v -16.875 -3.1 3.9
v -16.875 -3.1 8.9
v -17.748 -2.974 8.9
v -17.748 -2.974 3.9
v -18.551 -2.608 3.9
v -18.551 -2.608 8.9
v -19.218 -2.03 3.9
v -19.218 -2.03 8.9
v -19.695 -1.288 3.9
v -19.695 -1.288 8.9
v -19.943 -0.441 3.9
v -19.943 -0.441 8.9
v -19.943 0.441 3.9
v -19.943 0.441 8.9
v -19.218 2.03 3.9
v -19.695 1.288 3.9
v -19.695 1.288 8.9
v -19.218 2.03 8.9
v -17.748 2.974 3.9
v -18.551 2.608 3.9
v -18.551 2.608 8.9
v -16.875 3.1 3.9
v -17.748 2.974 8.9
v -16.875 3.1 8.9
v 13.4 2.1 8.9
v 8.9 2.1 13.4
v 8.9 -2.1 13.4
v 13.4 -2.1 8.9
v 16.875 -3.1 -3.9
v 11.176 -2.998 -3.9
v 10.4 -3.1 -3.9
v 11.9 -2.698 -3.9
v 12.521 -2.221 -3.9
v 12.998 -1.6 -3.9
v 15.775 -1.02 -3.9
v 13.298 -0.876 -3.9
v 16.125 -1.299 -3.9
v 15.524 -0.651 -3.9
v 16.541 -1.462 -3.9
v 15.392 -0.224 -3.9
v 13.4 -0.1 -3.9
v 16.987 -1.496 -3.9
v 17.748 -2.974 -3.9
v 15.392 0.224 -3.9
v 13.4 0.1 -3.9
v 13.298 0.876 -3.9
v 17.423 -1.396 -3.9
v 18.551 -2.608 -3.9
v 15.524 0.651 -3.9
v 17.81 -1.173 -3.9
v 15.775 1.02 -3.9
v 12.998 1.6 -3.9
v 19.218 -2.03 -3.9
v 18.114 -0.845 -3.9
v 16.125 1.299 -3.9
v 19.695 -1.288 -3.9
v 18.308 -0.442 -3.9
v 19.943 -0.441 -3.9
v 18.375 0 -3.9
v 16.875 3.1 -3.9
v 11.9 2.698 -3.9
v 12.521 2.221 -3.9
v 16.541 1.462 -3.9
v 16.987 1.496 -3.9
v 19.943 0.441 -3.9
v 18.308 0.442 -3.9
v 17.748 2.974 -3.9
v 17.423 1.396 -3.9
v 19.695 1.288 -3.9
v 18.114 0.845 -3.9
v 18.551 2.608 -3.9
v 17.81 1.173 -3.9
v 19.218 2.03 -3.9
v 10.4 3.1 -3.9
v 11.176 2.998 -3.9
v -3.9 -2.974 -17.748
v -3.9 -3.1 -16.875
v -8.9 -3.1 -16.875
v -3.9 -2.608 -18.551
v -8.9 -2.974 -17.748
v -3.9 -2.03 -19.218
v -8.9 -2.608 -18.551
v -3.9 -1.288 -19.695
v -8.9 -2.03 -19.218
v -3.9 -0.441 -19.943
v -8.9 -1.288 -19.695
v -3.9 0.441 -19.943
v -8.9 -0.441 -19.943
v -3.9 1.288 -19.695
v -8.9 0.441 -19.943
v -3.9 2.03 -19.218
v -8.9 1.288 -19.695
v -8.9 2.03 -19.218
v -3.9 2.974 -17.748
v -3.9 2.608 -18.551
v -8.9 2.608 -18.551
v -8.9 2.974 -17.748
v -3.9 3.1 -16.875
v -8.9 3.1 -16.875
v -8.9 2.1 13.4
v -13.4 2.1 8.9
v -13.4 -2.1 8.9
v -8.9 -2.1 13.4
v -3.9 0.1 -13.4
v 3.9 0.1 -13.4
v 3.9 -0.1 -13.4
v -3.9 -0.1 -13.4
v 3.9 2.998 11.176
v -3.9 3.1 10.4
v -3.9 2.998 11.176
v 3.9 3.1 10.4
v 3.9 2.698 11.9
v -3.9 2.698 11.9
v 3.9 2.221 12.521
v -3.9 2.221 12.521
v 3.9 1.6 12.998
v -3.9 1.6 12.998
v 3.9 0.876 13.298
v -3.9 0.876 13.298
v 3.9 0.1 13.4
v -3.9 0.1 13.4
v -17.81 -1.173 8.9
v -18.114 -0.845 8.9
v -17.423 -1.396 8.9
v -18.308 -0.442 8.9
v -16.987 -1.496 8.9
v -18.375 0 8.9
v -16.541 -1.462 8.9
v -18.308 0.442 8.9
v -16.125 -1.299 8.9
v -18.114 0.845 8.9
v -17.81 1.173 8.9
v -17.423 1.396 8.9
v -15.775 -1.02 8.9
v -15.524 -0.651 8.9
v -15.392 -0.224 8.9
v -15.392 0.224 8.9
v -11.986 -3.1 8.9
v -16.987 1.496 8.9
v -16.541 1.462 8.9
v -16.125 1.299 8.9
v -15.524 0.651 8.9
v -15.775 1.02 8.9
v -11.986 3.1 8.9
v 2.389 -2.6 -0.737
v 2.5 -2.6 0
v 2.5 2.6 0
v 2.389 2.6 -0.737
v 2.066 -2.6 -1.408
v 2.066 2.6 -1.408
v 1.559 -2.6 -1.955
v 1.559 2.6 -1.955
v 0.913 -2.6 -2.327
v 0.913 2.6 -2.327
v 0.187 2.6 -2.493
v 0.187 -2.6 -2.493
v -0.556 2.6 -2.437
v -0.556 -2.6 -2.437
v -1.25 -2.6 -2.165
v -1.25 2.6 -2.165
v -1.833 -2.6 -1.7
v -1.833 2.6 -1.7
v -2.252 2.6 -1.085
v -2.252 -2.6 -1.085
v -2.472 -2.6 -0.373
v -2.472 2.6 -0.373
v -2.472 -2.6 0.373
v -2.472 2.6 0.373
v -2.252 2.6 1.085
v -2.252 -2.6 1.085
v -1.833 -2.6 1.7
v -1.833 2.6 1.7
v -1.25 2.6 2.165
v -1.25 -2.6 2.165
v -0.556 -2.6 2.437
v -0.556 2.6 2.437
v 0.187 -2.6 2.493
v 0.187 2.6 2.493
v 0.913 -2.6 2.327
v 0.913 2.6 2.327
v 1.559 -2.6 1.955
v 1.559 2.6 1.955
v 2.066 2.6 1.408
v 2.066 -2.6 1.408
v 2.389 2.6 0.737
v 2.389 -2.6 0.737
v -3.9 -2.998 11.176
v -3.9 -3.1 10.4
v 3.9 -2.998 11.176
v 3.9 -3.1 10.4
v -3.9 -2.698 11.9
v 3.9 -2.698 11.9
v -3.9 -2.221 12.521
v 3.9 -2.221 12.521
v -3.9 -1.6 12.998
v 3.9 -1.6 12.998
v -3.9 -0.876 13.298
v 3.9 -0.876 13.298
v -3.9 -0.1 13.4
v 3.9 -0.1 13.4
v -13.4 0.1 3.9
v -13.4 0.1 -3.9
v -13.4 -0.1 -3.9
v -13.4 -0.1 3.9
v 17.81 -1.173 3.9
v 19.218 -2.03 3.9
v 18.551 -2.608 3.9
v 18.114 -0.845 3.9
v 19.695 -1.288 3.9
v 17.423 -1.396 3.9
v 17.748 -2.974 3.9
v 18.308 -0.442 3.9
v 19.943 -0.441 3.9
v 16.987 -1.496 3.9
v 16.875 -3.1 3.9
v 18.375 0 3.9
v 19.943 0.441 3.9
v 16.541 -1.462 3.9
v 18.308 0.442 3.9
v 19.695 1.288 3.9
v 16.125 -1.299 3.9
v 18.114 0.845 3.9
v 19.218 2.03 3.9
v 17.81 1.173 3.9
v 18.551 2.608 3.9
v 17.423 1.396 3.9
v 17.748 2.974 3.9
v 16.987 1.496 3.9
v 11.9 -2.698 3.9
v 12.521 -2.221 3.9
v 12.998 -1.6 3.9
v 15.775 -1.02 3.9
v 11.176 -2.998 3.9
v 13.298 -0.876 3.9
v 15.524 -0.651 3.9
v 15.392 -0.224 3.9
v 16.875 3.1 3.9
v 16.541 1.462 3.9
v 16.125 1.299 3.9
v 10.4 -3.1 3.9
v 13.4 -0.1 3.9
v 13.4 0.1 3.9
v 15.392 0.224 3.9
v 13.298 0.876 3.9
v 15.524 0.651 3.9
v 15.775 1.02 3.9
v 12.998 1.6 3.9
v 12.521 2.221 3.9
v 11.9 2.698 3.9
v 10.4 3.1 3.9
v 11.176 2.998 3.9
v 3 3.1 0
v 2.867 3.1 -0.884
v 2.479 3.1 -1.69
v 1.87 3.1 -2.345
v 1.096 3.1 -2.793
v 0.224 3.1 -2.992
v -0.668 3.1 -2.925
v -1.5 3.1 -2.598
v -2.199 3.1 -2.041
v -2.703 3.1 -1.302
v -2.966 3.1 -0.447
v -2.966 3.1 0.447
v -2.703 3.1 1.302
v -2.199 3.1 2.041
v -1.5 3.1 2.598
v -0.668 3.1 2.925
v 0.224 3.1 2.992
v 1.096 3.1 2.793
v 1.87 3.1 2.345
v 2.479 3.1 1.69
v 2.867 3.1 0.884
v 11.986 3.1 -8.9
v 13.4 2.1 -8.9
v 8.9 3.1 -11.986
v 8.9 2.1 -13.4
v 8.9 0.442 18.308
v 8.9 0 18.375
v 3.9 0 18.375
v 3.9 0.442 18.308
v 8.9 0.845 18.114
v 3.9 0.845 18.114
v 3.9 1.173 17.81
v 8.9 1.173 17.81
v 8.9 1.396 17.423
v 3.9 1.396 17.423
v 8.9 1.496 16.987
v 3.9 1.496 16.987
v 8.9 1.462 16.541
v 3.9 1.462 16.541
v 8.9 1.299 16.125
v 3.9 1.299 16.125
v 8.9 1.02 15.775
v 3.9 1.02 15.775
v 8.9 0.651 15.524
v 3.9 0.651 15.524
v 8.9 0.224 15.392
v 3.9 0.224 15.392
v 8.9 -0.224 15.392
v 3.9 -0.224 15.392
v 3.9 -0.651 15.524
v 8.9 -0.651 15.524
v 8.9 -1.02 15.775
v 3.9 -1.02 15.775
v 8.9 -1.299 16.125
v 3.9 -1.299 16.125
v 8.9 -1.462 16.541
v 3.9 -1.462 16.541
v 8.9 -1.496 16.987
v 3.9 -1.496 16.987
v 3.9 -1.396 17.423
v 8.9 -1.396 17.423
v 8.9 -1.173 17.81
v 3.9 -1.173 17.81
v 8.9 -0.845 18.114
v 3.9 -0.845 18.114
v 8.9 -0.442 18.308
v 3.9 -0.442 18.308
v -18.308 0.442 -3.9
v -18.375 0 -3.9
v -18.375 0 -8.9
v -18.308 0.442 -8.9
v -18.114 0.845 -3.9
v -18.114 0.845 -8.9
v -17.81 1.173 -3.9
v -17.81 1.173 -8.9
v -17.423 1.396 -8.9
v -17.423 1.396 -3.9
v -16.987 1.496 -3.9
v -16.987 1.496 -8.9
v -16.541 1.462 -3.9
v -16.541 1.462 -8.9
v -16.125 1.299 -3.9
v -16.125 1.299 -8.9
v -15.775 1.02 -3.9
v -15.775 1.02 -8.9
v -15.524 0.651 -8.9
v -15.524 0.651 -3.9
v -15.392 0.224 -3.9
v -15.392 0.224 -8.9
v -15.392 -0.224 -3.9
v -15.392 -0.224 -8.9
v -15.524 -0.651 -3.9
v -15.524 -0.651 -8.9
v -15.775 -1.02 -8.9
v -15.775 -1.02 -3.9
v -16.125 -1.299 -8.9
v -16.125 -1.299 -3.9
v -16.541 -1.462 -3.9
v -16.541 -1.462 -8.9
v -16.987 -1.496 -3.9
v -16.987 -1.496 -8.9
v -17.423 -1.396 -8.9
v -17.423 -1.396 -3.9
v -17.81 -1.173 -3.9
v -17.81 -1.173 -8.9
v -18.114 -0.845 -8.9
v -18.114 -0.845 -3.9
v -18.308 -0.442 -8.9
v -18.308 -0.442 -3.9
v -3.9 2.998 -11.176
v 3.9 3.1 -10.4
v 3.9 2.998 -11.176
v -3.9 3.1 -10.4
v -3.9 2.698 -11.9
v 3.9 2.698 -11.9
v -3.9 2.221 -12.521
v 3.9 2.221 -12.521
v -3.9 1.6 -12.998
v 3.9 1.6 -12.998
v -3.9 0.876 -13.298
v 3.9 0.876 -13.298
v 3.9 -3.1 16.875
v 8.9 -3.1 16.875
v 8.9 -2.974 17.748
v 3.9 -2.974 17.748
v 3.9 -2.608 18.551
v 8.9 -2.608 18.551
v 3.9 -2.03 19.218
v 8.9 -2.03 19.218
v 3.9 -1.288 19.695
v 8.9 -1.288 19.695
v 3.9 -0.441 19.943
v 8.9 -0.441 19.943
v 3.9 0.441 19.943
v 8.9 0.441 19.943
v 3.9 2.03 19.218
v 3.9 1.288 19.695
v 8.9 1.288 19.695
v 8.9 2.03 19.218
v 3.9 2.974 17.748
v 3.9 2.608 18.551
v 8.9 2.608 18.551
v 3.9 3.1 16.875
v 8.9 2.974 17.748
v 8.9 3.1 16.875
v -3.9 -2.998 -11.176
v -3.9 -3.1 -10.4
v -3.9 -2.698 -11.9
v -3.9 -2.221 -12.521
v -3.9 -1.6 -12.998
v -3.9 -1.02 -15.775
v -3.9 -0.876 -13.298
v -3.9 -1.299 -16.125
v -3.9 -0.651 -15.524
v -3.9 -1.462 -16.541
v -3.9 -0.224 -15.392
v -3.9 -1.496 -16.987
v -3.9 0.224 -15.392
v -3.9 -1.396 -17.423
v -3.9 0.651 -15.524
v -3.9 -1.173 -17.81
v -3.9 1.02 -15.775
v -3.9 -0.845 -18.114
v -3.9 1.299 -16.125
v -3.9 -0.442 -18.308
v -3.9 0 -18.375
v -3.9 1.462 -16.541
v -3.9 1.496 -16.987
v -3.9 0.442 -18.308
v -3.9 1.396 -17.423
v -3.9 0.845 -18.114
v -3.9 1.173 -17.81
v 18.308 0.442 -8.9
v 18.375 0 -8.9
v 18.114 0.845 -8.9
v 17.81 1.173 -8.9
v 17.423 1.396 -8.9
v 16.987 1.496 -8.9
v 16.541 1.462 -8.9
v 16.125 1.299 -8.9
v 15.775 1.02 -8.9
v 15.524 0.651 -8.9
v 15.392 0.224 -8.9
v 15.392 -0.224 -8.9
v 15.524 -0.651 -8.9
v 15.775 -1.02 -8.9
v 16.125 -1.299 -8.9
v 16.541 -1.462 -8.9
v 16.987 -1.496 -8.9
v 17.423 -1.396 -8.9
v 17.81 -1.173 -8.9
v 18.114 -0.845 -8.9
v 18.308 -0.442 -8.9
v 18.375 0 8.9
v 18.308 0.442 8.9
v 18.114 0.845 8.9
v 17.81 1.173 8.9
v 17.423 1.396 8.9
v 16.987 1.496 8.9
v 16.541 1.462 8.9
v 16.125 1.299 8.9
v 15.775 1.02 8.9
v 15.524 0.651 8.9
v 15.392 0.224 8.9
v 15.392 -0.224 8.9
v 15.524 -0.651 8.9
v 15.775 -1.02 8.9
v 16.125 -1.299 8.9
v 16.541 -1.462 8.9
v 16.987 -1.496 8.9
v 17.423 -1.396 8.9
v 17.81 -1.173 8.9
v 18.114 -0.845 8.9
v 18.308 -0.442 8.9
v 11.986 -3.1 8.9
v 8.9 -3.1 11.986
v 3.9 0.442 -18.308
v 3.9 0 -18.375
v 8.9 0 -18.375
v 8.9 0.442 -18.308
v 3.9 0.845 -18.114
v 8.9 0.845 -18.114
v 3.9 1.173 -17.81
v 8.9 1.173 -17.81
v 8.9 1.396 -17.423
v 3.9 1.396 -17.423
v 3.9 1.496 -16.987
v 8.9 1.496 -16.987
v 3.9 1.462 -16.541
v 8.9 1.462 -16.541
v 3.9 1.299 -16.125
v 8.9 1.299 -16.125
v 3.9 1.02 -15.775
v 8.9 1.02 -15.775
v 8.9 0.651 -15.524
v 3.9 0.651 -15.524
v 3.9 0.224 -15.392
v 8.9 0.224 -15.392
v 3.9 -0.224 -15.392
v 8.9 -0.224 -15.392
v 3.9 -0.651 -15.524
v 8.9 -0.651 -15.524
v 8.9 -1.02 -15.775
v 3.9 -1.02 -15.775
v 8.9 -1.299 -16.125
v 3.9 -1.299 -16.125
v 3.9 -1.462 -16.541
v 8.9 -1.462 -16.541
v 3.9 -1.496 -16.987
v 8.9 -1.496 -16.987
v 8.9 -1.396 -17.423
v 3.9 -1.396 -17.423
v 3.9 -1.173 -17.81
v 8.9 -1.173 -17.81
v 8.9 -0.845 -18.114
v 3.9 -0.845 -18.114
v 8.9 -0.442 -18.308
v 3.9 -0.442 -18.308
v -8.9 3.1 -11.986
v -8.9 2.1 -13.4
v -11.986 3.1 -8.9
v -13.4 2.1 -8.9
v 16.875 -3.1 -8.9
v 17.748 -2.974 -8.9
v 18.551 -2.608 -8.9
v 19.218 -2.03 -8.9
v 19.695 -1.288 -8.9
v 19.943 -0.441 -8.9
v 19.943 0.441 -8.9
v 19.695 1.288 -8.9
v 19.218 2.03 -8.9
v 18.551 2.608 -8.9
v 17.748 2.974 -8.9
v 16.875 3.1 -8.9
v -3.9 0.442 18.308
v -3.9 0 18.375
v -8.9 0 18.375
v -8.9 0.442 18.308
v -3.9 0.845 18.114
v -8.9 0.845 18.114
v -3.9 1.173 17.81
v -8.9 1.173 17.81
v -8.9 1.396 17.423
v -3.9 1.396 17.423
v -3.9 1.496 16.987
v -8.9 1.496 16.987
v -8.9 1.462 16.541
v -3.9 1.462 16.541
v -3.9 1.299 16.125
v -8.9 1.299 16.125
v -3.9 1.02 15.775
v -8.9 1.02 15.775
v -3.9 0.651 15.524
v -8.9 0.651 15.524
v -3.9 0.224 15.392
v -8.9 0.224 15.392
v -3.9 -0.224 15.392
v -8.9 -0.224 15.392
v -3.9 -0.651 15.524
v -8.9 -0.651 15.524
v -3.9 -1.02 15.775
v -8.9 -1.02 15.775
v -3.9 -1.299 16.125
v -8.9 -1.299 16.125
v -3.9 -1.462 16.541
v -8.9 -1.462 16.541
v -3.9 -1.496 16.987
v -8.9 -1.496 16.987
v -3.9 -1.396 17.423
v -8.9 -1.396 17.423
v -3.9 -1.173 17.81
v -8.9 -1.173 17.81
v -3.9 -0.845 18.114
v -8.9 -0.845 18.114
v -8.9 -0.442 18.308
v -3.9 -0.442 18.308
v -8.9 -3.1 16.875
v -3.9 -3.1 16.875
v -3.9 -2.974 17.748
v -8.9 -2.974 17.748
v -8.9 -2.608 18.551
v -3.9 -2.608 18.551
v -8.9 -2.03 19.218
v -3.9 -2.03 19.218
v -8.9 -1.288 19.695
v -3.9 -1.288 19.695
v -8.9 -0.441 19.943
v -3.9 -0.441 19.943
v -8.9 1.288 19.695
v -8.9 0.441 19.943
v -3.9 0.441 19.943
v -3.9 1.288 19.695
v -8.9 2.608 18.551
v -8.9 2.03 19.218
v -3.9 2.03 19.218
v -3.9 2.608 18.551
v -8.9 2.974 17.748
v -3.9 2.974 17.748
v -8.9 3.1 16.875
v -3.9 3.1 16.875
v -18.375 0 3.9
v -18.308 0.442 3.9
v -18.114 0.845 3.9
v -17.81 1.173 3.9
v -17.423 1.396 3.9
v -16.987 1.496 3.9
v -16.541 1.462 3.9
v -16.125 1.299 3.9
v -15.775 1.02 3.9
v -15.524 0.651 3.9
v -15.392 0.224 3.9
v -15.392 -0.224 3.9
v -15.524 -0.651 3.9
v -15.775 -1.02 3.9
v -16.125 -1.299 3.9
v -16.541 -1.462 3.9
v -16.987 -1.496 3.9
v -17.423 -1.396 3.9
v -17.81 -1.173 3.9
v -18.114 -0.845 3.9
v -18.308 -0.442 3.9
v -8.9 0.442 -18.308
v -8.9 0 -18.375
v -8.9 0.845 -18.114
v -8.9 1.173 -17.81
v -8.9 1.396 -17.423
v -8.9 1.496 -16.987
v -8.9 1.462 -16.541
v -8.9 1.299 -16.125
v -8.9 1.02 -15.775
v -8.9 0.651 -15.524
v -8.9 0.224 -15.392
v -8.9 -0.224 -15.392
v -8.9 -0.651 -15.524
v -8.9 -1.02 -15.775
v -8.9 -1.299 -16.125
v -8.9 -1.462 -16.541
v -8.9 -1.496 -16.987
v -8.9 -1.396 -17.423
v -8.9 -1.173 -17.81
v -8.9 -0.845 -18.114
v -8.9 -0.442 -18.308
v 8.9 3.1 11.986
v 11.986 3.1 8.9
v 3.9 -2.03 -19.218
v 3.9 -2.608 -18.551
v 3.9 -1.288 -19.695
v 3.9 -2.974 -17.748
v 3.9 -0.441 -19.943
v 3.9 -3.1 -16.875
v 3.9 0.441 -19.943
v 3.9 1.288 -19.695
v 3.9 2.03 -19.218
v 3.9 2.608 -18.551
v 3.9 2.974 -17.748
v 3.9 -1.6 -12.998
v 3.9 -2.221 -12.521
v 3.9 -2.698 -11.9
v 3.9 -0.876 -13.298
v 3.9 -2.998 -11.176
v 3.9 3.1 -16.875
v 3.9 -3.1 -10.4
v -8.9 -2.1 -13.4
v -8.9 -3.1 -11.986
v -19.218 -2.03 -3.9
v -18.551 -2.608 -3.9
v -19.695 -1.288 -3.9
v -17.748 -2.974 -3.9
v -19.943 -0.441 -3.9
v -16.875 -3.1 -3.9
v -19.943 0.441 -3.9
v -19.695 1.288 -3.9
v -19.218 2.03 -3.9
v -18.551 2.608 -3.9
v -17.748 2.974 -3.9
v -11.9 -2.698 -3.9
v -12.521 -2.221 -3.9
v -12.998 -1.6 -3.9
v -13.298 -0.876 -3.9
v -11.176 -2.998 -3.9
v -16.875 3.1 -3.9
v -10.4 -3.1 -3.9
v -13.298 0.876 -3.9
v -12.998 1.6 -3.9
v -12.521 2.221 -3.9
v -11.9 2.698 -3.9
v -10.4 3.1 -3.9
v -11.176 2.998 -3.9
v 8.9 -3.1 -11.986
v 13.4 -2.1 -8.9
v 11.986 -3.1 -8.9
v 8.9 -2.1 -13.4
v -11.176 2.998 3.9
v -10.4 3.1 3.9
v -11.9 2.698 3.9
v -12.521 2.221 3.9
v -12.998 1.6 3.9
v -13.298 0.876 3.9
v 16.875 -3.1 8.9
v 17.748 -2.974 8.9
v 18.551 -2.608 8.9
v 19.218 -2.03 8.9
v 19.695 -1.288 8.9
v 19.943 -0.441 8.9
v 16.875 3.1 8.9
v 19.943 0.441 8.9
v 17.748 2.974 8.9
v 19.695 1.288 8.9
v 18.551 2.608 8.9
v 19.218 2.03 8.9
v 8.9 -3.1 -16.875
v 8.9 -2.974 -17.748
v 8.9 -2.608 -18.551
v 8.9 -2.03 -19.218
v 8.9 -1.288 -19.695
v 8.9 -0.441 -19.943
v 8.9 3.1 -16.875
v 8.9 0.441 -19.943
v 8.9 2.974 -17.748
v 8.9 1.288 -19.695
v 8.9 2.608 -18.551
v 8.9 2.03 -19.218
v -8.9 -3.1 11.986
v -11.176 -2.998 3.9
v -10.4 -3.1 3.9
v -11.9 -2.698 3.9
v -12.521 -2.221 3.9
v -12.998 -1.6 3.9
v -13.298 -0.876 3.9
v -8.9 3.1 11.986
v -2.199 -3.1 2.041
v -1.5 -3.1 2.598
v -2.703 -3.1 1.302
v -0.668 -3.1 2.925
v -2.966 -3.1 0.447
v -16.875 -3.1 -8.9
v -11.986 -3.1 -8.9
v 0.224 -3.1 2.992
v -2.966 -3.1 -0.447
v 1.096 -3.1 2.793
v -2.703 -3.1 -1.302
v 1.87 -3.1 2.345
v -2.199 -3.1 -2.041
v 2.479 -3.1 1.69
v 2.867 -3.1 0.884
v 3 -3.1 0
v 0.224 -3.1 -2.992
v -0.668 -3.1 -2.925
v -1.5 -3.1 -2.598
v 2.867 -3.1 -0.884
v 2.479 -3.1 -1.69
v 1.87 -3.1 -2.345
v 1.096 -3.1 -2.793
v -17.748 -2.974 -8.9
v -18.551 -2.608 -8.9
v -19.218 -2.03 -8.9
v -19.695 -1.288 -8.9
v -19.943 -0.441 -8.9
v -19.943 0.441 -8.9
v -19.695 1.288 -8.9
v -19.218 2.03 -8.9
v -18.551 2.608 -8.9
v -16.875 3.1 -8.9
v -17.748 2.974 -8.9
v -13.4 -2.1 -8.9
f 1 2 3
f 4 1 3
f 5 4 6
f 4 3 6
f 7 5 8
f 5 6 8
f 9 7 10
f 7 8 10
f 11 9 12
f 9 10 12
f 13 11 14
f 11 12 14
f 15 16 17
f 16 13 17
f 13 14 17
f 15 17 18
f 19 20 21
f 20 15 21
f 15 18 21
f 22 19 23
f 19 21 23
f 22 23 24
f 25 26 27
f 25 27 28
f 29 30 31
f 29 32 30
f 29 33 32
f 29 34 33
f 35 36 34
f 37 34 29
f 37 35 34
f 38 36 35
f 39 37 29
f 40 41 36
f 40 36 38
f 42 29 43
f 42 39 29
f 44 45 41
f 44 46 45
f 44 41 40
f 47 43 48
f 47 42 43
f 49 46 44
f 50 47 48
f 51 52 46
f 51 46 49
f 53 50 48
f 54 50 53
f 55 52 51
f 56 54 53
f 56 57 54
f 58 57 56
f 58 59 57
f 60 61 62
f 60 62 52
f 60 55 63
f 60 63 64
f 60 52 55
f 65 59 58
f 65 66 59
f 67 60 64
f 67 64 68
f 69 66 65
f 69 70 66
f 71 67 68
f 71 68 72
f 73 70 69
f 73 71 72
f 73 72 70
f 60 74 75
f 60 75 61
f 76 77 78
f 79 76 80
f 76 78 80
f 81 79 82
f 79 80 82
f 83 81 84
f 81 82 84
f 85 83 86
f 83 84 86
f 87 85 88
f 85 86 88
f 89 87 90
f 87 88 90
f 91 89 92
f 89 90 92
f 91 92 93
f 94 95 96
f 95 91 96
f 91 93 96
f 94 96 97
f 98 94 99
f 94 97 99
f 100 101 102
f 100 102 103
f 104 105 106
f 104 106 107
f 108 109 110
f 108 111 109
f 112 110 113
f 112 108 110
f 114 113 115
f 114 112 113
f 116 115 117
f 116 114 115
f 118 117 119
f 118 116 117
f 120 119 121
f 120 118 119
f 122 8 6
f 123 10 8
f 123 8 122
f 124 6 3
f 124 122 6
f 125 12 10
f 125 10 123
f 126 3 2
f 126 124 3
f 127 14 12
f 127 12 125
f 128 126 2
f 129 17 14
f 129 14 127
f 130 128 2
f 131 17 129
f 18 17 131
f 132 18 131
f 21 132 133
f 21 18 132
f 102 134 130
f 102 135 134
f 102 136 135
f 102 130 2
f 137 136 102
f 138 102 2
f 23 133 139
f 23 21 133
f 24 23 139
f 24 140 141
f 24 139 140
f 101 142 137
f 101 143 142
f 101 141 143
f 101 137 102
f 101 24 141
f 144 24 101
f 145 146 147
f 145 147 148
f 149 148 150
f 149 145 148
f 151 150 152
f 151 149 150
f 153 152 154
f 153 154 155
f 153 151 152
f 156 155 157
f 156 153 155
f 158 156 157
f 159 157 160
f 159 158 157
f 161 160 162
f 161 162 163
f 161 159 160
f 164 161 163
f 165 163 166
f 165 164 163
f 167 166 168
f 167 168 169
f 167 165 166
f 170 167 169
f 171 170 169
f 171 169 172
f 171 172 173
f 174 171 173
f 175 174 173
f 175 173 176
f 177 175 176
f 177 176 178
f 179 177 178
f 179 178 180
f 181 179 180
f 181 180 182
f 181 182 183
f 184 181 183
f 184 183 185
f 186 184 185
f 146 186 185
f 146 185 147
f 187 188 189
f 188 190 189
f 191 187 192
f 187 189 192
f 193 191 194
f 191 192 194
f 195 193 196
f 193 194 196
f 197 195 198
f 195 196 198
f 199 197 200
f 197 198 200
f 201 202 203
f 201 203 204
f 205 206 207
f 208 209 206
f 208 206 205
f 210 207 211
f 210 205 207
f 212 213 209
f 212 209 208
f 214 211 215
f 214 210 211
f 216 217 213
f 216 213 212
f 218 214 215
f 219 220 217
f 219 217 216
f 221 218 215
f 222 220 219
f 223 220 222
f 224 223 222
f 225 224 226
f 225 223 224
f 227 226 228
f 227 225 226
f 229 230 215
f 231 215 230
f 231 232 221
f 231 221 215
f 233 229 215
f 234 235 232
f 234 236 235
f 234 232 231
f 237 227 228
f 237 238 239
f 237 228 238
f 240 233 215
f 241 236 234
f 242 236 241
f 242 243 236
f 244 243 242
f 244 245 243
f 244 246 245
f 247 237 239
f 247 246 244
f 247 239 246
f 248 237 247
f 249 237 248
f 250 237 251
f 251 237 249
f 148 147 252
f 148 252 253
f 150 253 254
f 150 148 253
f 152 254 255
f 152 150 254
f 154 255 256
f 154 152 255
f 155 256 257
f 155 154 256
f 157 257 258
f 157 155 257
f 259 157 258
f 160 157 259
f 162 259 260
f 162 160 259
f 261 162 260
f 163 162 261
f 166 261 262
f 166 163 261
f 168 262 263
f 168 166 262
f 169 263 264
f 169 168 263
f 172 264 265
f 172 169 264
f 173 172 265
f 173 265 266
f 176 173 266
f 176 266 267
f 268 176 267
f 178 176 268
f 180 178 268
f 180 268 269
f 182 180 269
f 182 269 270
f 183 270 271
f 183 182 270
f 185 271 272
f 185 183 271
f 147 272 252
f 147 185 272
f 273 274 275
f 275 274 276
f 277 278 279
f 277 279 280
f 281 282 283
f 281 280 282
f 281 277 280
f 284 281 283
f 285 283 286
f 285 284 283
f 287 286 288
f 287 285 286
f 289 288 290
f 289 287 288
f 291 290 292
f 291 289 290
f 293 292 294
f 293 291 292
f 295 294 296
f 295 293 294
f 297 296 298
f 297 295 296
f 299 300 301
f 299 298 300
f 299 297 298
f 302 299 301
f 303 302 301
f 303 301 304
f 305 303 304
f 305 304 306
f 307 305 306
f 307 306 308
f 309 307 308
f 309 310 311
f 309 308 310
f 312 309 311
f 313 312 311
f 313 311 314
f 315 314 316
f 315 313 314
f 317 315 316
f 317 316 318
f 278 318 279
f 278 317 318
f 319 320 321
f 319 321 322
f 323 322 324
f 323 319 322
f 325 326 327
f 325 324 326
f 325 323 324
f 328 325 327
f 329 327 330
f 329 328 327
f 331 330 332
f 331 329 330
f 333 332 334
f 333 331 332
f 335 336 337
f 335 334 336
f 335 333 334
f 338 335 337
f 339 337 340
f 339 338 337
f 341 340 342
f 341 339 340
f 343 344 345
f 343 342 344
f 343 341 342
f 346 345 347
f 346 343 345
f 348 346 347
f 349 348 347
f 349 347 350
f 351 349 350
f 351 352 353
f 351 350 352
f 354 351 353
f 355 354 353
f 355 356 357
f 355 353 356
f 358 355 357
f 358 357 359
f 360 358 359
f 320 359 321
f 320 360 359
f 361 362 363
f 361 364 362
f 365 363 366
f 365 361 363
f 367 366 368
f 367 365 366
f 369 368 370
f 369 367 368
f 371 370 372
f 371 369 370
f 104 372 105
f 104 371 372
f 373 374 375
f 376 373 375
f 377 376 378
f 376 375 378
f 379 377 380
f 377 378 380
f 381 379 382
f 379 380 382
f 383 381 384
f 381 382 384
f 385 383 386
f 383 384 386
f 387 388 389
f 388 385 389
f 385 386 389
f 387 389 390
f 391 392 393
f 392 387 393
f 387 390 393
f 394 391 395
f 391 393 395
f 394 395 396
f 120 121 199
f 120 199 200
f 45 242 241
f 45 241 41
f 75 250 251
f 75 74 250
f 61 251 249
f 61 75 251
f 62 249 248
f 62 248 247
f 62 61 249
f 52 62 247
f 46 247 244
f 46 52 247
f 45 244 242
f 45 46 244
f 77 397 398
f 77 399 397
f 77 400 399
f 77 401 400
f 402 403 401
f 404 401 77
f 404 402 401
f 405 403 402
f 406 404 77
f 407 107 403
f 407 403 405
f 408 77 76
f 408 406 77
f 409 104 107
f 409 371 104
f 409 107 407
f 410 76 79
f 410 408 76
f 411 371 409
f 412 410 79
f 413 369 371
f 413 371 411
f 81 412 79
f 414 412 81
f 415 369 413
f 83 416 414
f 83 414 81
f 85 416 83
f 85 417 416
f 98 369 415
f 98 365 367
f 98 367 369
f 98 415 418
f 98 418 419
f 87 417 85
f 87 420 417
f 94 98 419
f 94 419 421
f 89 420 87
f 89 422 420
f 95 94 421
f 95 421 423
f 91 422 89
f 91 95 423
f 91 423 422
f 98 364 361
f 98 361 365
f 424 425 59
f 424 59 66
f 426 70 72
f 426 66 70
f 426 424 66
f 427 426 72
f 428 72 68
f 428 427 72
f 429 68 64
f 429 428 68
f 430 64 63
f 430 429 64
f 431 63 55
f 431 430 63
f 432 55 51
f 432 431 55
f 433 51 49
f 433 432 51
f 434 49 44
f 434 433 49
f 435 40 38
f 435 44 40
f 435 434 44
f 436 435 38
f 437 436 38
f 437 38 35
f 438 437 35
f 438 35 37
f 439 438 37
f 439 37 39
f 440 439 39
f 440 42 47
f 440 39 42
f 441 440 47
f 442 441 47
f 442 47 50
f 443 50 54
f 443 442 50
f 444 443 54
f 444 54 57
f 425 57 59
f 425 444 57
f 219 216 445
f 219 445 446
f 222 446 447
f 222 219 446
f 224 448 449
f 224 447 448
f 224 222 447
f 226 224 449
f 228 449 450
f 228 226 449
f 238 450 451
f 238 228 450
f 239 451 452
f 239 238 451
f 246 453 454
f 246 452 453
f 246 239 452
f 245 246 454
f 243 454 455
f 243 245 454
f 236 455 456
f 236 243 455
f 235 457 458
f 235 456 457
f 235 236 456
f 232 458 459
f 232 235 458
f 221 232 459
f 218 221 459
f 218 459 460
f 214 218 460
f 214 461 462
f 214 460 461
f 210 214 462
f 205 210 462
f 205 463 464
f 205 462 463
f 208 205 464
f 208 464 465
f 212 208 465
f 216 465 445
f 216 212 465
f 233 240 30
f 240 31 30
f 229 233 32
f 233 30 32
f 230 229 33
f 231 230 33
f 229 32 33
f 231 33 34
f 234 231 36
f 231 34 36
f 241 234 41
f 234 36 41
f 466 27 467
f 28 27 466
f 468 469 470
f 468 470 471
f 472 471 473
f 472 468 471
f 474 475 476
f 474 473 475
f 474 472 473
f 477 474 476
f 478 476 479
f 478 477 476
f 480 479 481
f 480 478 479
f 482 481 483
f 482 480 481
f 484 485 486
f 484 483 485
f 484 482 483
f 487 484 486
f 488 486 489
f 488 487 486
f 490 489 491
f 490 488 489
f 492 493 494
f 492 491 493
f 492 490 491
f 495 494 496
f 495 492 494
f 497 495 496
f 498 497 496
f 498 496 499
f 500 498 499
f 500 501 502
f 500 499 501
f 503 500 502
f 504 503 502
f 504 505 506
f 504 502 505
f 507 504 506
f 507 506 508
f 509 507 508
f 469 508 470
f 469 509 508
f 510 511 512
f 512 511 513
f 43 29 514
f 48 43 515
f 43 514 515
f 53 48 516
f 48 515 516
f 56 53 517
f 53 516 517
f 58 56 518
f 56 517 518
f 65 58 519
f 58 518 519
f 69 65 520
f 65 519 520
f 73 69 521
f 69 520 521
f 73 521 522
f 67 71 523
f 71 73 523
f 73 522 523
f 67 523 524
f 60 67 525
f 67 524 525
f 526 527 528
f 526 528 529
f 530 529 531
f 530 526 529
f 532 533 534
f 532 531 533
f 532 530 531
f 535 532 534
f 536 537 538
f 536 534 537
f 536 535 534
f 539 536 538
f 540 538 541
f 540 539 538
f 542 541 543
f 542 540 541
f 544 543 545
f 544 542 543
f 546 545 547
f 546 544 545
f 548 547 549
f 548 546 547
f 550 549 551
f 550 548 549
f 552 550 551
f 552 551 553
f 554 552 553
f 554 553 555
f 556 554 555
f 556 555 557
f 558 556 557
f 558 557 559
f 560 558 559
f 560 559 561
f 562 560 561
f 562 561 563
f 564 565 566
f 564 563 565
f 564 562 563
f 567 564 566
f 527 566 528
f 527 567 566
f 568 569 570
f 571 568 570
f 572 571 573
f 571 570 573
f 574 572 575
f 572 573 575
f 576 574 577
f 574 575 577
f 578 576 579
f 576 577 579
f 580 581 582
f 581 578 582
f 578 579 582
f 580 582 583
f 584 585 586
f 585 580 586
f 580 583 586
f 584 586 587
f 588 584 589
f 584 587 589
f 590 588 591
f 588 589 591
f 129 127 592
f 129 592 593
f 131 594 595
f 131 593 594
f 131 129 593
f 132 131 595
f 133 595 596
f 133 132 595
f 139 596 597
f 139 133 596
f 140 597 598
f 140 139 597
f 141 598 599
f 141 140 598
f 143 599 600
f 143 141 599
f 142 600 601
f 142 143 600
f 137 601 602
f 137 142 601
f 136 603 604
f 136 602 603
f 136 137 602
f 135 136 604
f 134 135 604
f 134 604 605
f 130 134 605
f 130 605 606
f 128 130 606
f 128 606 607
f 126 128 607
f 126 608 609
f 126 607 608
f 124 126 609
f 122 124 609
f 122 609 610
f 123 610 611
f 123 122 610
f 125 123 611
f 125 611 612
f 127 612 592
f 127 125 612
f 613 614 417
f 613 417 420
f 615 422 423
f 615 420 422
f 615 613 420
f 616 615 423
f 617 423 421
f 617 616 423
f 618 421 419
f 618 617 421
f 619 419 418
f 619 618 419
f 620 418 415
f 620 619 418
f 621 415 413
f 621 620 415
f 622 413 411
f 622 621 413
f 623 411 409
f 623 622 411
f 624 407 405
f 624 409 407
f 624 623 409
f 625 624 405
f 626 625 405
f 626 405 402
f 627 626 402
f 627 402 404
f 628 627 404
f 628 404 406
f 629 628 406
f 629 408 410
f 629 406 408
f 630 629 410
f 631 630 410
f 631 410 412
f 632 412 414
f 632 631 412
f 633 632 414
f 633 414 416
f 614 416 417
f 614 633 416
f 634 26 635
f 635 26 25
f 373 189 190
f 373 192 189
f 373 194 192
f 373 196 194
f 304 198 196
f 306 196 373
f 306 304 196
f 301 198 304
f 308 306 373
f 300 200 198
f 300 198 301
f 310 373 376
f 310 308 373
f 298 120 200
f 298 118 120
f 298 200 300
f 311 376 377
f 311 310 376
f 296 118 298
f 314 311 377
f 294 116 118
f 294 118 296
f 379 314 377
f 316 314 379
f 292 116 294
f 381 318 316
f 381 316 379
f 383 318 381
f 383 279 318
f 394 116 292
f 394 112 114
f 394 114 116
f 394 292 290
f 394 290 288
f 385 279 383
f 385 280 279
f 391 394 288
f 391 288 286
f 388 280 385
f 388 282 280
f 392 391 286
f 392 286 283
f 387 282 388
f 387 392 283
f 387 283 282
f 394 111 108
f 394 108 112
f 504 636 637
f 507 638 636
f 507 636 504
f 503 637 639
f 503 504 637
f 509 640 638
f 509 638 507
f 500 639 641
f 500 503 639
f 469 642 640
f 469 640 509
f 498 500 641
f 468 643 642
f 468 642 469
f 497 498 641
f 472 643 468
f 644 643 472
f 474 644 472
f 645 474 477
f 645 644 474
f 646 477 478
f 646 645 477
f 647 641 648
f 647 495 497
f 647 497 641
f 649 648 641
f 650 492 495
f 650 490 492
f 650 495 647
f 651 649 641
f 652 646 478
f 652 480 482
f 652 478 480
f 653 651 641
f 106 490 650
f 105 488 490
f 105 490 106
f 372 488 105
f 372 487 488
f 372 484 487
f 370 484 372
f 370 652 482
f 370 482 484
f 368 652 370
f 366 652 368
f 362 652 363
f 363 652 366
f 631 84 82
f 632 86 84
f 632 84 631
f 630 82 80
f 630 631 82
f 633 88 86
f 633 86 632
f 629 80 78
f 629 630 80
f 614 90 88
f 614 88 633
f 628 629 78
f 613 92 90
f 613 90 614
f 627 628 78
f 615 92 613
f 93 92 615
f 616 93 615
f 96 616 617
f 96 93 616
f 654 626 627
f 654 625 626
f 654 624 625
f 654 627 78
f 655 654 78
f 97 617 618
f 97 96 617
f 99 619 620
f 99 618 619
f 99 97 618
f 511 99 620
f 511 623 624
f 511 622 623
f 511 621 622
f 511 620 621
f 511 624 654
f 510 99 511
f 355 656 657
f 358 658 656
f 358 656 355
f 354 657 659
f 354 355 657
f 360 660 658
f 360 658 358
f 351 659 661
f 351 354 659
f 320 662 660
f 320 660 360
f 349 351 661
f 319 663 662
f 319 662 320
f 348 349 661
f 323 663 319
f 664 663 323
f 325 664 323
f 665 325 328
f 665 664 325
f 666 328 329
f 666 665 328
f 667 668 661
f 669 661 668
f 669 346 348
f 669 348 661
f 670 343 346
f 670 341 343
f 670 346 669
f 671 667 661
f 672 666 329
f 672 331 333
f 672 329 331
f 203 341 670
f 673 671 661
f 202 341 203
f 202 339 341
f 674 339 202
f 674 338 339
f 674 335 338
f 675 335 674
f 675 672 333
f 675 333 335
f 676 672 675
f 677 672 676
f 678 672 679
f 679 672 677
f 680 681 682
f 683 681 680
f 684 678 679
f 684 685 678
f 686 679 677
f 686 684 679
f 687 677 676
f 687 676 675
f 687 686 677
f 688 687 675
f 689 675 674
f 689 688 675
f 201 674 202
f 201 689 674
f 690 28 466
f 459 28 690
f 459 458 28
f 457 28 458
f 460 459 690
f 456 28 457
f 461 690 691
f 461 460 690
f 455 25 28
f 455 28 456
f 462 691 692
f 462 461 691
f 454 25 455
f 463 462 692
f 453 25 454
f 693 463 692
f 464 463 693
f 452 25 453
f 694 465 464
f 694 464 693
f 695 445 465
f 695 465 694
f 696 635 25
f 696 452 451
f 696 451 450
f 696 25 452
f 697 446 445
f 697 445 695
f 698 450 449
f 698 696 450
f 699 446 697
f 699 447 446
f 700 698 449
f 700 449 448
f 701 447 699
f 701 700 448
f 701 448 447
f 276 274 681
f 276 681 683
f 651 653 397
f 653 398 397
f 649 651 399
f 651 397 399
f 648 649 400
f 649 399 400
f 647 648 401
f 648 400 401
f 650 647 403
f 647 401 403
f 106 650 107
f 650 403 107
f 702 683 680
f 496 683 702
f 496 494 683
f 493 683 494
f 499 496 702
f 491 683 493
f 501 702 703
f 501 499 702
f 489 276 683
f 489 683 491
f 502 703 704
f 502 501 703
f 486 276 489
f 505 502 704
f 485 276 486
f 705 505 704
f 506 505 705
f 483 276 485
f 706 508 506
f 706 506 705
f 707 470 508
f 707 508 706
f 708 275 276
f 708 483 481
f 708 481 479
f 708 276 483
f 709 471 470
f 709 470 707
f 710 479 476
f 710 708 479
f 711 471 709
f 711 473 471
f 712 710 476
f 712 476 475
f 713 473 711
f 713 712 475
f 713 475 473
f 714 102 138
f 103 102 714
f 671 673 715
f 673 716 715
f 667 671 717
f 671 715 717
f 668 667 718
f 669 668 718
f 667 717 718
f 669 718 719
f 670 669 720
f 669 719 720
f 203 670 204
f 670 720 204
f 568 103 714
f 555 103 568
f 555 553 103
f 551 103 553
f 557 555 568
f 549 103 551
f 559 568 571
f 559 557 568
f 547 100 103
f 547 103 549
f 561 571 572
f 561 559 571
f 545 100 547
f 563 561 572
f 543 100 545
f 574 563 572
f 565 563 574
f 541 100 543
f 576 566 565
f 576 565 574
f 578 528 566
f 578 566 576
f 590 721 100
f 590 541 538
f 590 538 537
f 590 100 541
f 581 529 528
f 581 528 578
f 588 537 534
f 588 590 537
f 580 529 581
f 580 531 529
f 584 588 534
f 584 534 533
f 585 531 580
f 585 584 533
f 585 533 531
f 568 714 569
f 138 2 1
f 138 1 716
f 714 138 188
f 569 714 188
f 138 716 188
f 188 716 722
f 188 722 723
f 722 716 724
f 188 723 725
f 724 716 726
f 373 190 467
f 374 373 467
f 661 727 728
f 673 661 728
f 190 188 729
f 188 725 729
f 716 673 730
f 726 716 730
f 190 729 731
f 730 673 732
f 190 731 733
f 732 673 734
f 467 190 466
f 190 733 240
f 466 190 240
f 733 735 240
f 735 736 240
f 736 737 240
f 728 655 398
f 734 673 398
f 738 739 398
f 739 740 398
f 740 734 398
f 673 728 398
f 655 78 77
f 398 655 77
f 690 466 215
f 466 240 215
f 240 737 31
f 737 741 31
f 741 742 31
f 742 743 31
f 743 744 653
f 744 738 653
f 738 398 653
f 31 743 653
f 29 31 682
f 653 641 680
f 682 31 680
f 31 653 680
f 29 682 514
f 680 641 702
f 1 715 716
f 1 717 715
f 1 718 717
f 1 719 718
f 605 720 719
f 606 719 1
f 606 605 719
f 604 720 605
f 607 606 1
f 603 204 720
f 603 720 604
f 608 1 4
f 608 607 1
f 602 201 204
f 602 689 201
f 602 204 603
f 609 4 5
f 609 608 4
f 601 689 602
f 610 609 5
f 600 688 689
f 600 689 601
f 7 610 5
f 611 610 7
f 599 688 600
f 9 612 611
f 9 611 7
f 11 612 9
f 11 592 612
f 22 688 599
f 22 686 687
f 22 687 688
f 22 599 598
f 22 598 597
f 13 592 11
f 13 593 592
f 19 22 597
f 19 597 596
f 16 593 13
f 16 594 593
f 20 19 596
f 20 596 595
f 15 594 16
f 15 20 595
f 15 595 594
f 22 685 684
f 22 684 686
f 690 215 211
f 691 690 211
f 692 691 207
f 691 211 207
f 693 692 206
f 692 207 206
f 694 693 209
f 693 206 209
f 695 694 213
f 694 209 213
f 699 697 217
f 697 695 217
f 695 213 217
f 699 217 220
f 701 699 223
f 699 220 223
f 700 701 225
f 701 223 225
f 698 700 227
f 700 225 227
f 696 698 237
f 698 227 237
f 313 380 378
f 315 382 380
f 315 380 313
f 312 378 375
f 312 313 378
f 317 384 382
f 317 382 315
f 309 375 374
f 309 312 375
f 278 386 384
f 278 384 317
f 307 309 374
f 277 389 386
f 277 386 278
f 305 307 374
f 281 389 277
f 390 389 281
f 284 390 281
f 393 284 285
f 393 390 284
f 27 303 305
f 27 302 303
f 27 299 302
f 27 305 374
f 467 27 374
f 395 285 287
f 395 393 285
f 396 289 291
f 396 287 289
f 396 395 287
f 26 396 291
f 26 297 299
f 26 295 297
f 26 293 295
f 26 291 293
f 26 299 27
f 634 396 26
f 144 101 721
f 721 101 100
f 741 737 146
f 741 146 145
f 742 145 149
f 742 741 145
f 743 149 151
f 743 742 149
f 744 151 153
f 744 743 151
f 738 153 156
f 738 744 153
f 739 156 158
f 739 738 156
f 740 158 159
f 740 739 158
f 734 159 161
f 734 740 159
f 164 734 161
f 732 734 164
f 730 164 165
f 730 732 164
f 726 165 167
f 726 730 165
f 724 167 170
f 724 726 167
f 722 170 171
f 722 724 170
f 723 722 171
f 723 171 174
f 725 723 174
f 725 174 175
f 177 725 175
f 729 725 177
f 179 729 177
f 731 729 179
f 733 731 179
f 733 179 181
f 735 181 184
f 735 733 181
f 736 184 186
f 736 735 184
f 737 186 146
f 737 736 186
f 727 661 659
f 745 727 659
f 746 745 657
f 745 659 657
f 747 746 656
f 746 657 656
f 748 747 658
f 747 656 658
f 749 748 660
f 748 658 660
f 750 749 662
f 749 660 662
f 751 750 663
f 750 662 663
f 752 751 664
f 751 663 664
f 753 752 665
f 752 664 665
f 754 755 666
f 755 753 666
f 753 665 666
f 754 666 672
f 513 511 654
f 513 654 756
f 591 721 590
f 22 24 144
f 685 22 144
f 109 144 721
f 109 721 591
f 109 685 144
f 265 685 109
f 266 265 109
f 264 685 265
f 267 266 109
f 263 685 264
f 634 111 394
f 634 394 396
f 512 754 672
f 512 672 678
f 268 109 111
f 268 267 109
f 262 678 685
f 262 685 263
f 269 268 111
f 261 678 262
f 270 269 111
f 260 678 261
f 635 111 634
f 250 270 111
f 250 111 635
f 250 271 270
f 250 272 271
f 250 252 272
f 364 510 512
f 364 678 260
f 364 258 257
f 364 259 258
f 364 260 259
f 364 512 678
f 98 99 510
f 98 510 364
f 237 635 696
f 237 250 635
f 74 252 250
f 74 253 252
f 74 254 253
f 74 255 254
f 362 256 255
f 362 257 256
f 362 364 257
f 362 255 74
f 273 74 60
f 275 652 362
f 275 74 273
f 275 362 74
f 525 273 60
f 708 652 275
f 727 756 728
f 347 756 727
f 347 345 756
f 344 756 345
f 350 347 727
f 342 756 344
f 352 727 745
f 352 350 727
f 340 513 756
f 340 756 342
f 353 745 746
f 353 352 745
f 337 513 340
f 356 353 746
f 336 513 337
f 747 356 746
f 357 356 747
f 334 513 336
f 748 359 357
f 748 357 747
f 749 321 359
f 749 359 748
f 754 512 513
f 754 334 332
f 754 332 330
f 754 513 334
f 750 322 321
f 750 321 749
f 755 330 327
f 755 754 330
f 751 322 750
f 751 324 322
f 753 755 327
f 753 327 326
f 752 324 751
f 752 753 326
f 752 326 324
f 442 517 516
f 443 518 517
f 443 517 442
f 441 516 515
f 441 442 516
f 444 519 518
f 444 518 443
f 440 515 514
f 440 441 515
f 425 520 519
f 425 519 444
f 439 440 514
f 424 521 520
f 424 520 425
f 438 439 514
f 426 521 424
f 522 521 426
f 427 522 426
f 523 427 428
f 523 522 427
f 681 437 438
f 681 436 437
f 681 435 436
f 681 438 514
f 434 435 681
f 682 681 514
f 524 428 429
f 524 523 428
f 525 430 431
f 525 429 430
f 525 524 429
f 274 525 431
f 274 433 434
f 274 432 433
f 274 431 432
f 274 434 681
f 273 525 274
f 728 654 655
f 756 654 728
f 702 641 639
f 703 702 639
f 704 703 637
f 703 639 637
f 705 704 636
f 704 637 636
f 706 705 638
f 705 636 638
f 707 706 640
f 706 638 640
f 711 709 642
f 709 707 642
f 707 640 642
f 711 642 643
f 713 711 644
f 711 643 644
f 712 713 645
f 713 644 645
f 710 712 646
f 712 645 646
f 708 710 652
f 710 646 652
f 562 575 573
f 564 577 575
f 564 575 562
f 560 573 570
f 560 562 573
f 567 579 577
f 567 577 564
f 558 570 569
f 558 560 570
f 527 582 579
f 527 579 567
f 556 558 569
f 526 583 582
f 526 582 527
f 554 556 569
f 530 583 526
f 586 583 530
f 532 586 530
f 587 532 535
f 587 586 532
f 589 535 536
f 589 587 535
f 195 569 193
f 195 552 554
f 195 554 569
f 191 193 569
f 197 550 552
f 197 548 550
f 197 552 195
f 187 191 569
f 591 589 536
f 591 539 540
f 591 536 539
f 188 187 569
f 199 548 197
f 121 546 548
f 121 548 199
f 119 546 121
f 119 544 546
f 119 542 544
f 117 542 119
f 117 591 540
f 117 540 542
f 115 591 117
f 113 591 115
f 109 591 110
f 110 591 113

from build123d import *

# Parameters (mm, degrees)
SKETCH1_R           = 2.5
BOSS_EXTRUDE1_DEPTH = 3.1
CUT_EXTRUDE1_START  = -30.25
SKETCH2_R           = 1.5
CUT_EXTRUDE1_DEPTH  = 42.7
CIRPATTERN1_COUNT   = 4
FILLET1_R           = 3
CHAMFER1_SIZE       = 1
CHAMFER3_SIZE       = 0.5


with BuildPart() as part:
    # Sketch1 → Boss-Extrude1 (new body, symmetric)
    with BuildSketch(Plane(origin=(0, 0, 0), x_dir=(1, 0, 0), z_dir=(0, 1, 0))):
        Polygon((-8.9, -13.4), (-8.9, -20.35), (-3.9, -20.35), (-3.9, -13.4), (3.9, -13.4), (3.9, -20.35), (8.9, -20.35), (8.9, -13.4), (13.4, -8.9), (20.35, -8.9), (20.35, -3.9), (13.4, -3.9), (13.4, 3.9), (20.35, 3.9), (20.35, 8.9), (13.4, 8.9), (8.9, 13.4), (8.9, 20.35), (3.9, 20.35), (3.9, 13.4), (-3.9, 13.4), (-3.9, 20.35), (-8.9, 20.35), (-8.9, 13.4), (-13.4, 8.9), (-20.35, 8.9), (-20.35, 3.9), (-13.4, 3.9), (-13.4, -3.9), (-20.35, -3.9), (-20.35, -8.9), (-13.4, -8.9), align=None)
        Circle(SKETCH1_R, mode=Mode.SUBTRACT)
    extrude(amount=BOSS_EXTRUDE1_DEPTH, both=True)

    # Sketch2 → Cut-Extrude1 (cut)
    with BuildSketch(Plane.ZY.offset(8.9).offset(CUT_EXTRUDE1_START)):
        with Locations((16.875, 0)):
            Circle(SKETCH2_R)
        with BuildLine():
            Line((16.875, 3.1), (20.35, 3.1))
            Line((20.35, 3.1), (20.35, -3.1))
            Line((20.35, -3.1), (16.875, -3.1))
            ThreePointArc((16.875, -3.1), (19.975, 0), (16.875, 3.1))
        make_face()
    cut_extrude1 = extrude(amount=CUT_EXTRUDE1_DEPTH, mode=Mode.SUBTRACT)

    # CirPattern1: Cut-Extrude1 ×4 about axis
    cirpattern1_axis = Axis((0, 3.1, 0), (0, 1, 0))
    for i in range(1, CIRPATTERN1_COUNT):
        add(cut_extrude1.rotate(cirpattern1_axis, i * 360 / CIRPATTERN1_COUNT), mode=Mode.SUBTRACT)

    # Fillet1
    fillet1_edges = [part.edges().sort_by_distance(p)[0] for p in [
        (-13.4, 3.1, 0),
        (0, 3.1, 13.4),
        (-13.4, -3.1, 0),
        (0, -3.1, -13.4),
        (13.4, -3.1, 0),
        (0, -3.1, 13.4),
        (13.4, 3.1, 0),
        (0, 3.1, -13.4),
    ]]
    fillet(fillet1_edges, radius=FILLET1_R)

    # Chamfer1
    chamfer1_edges = [part.edges().sort_by_distance(p)[0] for p in [
        (-11.15, 3.1, -11.15),
        (-11.15, -3.1, -11.15),
        (11.15, -3.1, -11.15),
        (11.15, 3.1, 11.15),
        (11.15, -3.1, 11.15),
        (-11.15, -3.1, 11.15),
        (-11.15, 3.1, 11.15),
        (11.15, 3.1, -11.15),
    ]]
    chamfer(chamfer1_edges, length=CHAMFER1_SIZE)

    # Chamfer3
    chamfer3_edges = [part.edges().sort_by_distance(p)[0] for p in [
        (-2.5, -3.1, 0),
        (-2.5, 3.1, 0),
    ]]
    chamfer(chamfer3_edges, length=CHAMFER3_SIZE)


solid = part.part
